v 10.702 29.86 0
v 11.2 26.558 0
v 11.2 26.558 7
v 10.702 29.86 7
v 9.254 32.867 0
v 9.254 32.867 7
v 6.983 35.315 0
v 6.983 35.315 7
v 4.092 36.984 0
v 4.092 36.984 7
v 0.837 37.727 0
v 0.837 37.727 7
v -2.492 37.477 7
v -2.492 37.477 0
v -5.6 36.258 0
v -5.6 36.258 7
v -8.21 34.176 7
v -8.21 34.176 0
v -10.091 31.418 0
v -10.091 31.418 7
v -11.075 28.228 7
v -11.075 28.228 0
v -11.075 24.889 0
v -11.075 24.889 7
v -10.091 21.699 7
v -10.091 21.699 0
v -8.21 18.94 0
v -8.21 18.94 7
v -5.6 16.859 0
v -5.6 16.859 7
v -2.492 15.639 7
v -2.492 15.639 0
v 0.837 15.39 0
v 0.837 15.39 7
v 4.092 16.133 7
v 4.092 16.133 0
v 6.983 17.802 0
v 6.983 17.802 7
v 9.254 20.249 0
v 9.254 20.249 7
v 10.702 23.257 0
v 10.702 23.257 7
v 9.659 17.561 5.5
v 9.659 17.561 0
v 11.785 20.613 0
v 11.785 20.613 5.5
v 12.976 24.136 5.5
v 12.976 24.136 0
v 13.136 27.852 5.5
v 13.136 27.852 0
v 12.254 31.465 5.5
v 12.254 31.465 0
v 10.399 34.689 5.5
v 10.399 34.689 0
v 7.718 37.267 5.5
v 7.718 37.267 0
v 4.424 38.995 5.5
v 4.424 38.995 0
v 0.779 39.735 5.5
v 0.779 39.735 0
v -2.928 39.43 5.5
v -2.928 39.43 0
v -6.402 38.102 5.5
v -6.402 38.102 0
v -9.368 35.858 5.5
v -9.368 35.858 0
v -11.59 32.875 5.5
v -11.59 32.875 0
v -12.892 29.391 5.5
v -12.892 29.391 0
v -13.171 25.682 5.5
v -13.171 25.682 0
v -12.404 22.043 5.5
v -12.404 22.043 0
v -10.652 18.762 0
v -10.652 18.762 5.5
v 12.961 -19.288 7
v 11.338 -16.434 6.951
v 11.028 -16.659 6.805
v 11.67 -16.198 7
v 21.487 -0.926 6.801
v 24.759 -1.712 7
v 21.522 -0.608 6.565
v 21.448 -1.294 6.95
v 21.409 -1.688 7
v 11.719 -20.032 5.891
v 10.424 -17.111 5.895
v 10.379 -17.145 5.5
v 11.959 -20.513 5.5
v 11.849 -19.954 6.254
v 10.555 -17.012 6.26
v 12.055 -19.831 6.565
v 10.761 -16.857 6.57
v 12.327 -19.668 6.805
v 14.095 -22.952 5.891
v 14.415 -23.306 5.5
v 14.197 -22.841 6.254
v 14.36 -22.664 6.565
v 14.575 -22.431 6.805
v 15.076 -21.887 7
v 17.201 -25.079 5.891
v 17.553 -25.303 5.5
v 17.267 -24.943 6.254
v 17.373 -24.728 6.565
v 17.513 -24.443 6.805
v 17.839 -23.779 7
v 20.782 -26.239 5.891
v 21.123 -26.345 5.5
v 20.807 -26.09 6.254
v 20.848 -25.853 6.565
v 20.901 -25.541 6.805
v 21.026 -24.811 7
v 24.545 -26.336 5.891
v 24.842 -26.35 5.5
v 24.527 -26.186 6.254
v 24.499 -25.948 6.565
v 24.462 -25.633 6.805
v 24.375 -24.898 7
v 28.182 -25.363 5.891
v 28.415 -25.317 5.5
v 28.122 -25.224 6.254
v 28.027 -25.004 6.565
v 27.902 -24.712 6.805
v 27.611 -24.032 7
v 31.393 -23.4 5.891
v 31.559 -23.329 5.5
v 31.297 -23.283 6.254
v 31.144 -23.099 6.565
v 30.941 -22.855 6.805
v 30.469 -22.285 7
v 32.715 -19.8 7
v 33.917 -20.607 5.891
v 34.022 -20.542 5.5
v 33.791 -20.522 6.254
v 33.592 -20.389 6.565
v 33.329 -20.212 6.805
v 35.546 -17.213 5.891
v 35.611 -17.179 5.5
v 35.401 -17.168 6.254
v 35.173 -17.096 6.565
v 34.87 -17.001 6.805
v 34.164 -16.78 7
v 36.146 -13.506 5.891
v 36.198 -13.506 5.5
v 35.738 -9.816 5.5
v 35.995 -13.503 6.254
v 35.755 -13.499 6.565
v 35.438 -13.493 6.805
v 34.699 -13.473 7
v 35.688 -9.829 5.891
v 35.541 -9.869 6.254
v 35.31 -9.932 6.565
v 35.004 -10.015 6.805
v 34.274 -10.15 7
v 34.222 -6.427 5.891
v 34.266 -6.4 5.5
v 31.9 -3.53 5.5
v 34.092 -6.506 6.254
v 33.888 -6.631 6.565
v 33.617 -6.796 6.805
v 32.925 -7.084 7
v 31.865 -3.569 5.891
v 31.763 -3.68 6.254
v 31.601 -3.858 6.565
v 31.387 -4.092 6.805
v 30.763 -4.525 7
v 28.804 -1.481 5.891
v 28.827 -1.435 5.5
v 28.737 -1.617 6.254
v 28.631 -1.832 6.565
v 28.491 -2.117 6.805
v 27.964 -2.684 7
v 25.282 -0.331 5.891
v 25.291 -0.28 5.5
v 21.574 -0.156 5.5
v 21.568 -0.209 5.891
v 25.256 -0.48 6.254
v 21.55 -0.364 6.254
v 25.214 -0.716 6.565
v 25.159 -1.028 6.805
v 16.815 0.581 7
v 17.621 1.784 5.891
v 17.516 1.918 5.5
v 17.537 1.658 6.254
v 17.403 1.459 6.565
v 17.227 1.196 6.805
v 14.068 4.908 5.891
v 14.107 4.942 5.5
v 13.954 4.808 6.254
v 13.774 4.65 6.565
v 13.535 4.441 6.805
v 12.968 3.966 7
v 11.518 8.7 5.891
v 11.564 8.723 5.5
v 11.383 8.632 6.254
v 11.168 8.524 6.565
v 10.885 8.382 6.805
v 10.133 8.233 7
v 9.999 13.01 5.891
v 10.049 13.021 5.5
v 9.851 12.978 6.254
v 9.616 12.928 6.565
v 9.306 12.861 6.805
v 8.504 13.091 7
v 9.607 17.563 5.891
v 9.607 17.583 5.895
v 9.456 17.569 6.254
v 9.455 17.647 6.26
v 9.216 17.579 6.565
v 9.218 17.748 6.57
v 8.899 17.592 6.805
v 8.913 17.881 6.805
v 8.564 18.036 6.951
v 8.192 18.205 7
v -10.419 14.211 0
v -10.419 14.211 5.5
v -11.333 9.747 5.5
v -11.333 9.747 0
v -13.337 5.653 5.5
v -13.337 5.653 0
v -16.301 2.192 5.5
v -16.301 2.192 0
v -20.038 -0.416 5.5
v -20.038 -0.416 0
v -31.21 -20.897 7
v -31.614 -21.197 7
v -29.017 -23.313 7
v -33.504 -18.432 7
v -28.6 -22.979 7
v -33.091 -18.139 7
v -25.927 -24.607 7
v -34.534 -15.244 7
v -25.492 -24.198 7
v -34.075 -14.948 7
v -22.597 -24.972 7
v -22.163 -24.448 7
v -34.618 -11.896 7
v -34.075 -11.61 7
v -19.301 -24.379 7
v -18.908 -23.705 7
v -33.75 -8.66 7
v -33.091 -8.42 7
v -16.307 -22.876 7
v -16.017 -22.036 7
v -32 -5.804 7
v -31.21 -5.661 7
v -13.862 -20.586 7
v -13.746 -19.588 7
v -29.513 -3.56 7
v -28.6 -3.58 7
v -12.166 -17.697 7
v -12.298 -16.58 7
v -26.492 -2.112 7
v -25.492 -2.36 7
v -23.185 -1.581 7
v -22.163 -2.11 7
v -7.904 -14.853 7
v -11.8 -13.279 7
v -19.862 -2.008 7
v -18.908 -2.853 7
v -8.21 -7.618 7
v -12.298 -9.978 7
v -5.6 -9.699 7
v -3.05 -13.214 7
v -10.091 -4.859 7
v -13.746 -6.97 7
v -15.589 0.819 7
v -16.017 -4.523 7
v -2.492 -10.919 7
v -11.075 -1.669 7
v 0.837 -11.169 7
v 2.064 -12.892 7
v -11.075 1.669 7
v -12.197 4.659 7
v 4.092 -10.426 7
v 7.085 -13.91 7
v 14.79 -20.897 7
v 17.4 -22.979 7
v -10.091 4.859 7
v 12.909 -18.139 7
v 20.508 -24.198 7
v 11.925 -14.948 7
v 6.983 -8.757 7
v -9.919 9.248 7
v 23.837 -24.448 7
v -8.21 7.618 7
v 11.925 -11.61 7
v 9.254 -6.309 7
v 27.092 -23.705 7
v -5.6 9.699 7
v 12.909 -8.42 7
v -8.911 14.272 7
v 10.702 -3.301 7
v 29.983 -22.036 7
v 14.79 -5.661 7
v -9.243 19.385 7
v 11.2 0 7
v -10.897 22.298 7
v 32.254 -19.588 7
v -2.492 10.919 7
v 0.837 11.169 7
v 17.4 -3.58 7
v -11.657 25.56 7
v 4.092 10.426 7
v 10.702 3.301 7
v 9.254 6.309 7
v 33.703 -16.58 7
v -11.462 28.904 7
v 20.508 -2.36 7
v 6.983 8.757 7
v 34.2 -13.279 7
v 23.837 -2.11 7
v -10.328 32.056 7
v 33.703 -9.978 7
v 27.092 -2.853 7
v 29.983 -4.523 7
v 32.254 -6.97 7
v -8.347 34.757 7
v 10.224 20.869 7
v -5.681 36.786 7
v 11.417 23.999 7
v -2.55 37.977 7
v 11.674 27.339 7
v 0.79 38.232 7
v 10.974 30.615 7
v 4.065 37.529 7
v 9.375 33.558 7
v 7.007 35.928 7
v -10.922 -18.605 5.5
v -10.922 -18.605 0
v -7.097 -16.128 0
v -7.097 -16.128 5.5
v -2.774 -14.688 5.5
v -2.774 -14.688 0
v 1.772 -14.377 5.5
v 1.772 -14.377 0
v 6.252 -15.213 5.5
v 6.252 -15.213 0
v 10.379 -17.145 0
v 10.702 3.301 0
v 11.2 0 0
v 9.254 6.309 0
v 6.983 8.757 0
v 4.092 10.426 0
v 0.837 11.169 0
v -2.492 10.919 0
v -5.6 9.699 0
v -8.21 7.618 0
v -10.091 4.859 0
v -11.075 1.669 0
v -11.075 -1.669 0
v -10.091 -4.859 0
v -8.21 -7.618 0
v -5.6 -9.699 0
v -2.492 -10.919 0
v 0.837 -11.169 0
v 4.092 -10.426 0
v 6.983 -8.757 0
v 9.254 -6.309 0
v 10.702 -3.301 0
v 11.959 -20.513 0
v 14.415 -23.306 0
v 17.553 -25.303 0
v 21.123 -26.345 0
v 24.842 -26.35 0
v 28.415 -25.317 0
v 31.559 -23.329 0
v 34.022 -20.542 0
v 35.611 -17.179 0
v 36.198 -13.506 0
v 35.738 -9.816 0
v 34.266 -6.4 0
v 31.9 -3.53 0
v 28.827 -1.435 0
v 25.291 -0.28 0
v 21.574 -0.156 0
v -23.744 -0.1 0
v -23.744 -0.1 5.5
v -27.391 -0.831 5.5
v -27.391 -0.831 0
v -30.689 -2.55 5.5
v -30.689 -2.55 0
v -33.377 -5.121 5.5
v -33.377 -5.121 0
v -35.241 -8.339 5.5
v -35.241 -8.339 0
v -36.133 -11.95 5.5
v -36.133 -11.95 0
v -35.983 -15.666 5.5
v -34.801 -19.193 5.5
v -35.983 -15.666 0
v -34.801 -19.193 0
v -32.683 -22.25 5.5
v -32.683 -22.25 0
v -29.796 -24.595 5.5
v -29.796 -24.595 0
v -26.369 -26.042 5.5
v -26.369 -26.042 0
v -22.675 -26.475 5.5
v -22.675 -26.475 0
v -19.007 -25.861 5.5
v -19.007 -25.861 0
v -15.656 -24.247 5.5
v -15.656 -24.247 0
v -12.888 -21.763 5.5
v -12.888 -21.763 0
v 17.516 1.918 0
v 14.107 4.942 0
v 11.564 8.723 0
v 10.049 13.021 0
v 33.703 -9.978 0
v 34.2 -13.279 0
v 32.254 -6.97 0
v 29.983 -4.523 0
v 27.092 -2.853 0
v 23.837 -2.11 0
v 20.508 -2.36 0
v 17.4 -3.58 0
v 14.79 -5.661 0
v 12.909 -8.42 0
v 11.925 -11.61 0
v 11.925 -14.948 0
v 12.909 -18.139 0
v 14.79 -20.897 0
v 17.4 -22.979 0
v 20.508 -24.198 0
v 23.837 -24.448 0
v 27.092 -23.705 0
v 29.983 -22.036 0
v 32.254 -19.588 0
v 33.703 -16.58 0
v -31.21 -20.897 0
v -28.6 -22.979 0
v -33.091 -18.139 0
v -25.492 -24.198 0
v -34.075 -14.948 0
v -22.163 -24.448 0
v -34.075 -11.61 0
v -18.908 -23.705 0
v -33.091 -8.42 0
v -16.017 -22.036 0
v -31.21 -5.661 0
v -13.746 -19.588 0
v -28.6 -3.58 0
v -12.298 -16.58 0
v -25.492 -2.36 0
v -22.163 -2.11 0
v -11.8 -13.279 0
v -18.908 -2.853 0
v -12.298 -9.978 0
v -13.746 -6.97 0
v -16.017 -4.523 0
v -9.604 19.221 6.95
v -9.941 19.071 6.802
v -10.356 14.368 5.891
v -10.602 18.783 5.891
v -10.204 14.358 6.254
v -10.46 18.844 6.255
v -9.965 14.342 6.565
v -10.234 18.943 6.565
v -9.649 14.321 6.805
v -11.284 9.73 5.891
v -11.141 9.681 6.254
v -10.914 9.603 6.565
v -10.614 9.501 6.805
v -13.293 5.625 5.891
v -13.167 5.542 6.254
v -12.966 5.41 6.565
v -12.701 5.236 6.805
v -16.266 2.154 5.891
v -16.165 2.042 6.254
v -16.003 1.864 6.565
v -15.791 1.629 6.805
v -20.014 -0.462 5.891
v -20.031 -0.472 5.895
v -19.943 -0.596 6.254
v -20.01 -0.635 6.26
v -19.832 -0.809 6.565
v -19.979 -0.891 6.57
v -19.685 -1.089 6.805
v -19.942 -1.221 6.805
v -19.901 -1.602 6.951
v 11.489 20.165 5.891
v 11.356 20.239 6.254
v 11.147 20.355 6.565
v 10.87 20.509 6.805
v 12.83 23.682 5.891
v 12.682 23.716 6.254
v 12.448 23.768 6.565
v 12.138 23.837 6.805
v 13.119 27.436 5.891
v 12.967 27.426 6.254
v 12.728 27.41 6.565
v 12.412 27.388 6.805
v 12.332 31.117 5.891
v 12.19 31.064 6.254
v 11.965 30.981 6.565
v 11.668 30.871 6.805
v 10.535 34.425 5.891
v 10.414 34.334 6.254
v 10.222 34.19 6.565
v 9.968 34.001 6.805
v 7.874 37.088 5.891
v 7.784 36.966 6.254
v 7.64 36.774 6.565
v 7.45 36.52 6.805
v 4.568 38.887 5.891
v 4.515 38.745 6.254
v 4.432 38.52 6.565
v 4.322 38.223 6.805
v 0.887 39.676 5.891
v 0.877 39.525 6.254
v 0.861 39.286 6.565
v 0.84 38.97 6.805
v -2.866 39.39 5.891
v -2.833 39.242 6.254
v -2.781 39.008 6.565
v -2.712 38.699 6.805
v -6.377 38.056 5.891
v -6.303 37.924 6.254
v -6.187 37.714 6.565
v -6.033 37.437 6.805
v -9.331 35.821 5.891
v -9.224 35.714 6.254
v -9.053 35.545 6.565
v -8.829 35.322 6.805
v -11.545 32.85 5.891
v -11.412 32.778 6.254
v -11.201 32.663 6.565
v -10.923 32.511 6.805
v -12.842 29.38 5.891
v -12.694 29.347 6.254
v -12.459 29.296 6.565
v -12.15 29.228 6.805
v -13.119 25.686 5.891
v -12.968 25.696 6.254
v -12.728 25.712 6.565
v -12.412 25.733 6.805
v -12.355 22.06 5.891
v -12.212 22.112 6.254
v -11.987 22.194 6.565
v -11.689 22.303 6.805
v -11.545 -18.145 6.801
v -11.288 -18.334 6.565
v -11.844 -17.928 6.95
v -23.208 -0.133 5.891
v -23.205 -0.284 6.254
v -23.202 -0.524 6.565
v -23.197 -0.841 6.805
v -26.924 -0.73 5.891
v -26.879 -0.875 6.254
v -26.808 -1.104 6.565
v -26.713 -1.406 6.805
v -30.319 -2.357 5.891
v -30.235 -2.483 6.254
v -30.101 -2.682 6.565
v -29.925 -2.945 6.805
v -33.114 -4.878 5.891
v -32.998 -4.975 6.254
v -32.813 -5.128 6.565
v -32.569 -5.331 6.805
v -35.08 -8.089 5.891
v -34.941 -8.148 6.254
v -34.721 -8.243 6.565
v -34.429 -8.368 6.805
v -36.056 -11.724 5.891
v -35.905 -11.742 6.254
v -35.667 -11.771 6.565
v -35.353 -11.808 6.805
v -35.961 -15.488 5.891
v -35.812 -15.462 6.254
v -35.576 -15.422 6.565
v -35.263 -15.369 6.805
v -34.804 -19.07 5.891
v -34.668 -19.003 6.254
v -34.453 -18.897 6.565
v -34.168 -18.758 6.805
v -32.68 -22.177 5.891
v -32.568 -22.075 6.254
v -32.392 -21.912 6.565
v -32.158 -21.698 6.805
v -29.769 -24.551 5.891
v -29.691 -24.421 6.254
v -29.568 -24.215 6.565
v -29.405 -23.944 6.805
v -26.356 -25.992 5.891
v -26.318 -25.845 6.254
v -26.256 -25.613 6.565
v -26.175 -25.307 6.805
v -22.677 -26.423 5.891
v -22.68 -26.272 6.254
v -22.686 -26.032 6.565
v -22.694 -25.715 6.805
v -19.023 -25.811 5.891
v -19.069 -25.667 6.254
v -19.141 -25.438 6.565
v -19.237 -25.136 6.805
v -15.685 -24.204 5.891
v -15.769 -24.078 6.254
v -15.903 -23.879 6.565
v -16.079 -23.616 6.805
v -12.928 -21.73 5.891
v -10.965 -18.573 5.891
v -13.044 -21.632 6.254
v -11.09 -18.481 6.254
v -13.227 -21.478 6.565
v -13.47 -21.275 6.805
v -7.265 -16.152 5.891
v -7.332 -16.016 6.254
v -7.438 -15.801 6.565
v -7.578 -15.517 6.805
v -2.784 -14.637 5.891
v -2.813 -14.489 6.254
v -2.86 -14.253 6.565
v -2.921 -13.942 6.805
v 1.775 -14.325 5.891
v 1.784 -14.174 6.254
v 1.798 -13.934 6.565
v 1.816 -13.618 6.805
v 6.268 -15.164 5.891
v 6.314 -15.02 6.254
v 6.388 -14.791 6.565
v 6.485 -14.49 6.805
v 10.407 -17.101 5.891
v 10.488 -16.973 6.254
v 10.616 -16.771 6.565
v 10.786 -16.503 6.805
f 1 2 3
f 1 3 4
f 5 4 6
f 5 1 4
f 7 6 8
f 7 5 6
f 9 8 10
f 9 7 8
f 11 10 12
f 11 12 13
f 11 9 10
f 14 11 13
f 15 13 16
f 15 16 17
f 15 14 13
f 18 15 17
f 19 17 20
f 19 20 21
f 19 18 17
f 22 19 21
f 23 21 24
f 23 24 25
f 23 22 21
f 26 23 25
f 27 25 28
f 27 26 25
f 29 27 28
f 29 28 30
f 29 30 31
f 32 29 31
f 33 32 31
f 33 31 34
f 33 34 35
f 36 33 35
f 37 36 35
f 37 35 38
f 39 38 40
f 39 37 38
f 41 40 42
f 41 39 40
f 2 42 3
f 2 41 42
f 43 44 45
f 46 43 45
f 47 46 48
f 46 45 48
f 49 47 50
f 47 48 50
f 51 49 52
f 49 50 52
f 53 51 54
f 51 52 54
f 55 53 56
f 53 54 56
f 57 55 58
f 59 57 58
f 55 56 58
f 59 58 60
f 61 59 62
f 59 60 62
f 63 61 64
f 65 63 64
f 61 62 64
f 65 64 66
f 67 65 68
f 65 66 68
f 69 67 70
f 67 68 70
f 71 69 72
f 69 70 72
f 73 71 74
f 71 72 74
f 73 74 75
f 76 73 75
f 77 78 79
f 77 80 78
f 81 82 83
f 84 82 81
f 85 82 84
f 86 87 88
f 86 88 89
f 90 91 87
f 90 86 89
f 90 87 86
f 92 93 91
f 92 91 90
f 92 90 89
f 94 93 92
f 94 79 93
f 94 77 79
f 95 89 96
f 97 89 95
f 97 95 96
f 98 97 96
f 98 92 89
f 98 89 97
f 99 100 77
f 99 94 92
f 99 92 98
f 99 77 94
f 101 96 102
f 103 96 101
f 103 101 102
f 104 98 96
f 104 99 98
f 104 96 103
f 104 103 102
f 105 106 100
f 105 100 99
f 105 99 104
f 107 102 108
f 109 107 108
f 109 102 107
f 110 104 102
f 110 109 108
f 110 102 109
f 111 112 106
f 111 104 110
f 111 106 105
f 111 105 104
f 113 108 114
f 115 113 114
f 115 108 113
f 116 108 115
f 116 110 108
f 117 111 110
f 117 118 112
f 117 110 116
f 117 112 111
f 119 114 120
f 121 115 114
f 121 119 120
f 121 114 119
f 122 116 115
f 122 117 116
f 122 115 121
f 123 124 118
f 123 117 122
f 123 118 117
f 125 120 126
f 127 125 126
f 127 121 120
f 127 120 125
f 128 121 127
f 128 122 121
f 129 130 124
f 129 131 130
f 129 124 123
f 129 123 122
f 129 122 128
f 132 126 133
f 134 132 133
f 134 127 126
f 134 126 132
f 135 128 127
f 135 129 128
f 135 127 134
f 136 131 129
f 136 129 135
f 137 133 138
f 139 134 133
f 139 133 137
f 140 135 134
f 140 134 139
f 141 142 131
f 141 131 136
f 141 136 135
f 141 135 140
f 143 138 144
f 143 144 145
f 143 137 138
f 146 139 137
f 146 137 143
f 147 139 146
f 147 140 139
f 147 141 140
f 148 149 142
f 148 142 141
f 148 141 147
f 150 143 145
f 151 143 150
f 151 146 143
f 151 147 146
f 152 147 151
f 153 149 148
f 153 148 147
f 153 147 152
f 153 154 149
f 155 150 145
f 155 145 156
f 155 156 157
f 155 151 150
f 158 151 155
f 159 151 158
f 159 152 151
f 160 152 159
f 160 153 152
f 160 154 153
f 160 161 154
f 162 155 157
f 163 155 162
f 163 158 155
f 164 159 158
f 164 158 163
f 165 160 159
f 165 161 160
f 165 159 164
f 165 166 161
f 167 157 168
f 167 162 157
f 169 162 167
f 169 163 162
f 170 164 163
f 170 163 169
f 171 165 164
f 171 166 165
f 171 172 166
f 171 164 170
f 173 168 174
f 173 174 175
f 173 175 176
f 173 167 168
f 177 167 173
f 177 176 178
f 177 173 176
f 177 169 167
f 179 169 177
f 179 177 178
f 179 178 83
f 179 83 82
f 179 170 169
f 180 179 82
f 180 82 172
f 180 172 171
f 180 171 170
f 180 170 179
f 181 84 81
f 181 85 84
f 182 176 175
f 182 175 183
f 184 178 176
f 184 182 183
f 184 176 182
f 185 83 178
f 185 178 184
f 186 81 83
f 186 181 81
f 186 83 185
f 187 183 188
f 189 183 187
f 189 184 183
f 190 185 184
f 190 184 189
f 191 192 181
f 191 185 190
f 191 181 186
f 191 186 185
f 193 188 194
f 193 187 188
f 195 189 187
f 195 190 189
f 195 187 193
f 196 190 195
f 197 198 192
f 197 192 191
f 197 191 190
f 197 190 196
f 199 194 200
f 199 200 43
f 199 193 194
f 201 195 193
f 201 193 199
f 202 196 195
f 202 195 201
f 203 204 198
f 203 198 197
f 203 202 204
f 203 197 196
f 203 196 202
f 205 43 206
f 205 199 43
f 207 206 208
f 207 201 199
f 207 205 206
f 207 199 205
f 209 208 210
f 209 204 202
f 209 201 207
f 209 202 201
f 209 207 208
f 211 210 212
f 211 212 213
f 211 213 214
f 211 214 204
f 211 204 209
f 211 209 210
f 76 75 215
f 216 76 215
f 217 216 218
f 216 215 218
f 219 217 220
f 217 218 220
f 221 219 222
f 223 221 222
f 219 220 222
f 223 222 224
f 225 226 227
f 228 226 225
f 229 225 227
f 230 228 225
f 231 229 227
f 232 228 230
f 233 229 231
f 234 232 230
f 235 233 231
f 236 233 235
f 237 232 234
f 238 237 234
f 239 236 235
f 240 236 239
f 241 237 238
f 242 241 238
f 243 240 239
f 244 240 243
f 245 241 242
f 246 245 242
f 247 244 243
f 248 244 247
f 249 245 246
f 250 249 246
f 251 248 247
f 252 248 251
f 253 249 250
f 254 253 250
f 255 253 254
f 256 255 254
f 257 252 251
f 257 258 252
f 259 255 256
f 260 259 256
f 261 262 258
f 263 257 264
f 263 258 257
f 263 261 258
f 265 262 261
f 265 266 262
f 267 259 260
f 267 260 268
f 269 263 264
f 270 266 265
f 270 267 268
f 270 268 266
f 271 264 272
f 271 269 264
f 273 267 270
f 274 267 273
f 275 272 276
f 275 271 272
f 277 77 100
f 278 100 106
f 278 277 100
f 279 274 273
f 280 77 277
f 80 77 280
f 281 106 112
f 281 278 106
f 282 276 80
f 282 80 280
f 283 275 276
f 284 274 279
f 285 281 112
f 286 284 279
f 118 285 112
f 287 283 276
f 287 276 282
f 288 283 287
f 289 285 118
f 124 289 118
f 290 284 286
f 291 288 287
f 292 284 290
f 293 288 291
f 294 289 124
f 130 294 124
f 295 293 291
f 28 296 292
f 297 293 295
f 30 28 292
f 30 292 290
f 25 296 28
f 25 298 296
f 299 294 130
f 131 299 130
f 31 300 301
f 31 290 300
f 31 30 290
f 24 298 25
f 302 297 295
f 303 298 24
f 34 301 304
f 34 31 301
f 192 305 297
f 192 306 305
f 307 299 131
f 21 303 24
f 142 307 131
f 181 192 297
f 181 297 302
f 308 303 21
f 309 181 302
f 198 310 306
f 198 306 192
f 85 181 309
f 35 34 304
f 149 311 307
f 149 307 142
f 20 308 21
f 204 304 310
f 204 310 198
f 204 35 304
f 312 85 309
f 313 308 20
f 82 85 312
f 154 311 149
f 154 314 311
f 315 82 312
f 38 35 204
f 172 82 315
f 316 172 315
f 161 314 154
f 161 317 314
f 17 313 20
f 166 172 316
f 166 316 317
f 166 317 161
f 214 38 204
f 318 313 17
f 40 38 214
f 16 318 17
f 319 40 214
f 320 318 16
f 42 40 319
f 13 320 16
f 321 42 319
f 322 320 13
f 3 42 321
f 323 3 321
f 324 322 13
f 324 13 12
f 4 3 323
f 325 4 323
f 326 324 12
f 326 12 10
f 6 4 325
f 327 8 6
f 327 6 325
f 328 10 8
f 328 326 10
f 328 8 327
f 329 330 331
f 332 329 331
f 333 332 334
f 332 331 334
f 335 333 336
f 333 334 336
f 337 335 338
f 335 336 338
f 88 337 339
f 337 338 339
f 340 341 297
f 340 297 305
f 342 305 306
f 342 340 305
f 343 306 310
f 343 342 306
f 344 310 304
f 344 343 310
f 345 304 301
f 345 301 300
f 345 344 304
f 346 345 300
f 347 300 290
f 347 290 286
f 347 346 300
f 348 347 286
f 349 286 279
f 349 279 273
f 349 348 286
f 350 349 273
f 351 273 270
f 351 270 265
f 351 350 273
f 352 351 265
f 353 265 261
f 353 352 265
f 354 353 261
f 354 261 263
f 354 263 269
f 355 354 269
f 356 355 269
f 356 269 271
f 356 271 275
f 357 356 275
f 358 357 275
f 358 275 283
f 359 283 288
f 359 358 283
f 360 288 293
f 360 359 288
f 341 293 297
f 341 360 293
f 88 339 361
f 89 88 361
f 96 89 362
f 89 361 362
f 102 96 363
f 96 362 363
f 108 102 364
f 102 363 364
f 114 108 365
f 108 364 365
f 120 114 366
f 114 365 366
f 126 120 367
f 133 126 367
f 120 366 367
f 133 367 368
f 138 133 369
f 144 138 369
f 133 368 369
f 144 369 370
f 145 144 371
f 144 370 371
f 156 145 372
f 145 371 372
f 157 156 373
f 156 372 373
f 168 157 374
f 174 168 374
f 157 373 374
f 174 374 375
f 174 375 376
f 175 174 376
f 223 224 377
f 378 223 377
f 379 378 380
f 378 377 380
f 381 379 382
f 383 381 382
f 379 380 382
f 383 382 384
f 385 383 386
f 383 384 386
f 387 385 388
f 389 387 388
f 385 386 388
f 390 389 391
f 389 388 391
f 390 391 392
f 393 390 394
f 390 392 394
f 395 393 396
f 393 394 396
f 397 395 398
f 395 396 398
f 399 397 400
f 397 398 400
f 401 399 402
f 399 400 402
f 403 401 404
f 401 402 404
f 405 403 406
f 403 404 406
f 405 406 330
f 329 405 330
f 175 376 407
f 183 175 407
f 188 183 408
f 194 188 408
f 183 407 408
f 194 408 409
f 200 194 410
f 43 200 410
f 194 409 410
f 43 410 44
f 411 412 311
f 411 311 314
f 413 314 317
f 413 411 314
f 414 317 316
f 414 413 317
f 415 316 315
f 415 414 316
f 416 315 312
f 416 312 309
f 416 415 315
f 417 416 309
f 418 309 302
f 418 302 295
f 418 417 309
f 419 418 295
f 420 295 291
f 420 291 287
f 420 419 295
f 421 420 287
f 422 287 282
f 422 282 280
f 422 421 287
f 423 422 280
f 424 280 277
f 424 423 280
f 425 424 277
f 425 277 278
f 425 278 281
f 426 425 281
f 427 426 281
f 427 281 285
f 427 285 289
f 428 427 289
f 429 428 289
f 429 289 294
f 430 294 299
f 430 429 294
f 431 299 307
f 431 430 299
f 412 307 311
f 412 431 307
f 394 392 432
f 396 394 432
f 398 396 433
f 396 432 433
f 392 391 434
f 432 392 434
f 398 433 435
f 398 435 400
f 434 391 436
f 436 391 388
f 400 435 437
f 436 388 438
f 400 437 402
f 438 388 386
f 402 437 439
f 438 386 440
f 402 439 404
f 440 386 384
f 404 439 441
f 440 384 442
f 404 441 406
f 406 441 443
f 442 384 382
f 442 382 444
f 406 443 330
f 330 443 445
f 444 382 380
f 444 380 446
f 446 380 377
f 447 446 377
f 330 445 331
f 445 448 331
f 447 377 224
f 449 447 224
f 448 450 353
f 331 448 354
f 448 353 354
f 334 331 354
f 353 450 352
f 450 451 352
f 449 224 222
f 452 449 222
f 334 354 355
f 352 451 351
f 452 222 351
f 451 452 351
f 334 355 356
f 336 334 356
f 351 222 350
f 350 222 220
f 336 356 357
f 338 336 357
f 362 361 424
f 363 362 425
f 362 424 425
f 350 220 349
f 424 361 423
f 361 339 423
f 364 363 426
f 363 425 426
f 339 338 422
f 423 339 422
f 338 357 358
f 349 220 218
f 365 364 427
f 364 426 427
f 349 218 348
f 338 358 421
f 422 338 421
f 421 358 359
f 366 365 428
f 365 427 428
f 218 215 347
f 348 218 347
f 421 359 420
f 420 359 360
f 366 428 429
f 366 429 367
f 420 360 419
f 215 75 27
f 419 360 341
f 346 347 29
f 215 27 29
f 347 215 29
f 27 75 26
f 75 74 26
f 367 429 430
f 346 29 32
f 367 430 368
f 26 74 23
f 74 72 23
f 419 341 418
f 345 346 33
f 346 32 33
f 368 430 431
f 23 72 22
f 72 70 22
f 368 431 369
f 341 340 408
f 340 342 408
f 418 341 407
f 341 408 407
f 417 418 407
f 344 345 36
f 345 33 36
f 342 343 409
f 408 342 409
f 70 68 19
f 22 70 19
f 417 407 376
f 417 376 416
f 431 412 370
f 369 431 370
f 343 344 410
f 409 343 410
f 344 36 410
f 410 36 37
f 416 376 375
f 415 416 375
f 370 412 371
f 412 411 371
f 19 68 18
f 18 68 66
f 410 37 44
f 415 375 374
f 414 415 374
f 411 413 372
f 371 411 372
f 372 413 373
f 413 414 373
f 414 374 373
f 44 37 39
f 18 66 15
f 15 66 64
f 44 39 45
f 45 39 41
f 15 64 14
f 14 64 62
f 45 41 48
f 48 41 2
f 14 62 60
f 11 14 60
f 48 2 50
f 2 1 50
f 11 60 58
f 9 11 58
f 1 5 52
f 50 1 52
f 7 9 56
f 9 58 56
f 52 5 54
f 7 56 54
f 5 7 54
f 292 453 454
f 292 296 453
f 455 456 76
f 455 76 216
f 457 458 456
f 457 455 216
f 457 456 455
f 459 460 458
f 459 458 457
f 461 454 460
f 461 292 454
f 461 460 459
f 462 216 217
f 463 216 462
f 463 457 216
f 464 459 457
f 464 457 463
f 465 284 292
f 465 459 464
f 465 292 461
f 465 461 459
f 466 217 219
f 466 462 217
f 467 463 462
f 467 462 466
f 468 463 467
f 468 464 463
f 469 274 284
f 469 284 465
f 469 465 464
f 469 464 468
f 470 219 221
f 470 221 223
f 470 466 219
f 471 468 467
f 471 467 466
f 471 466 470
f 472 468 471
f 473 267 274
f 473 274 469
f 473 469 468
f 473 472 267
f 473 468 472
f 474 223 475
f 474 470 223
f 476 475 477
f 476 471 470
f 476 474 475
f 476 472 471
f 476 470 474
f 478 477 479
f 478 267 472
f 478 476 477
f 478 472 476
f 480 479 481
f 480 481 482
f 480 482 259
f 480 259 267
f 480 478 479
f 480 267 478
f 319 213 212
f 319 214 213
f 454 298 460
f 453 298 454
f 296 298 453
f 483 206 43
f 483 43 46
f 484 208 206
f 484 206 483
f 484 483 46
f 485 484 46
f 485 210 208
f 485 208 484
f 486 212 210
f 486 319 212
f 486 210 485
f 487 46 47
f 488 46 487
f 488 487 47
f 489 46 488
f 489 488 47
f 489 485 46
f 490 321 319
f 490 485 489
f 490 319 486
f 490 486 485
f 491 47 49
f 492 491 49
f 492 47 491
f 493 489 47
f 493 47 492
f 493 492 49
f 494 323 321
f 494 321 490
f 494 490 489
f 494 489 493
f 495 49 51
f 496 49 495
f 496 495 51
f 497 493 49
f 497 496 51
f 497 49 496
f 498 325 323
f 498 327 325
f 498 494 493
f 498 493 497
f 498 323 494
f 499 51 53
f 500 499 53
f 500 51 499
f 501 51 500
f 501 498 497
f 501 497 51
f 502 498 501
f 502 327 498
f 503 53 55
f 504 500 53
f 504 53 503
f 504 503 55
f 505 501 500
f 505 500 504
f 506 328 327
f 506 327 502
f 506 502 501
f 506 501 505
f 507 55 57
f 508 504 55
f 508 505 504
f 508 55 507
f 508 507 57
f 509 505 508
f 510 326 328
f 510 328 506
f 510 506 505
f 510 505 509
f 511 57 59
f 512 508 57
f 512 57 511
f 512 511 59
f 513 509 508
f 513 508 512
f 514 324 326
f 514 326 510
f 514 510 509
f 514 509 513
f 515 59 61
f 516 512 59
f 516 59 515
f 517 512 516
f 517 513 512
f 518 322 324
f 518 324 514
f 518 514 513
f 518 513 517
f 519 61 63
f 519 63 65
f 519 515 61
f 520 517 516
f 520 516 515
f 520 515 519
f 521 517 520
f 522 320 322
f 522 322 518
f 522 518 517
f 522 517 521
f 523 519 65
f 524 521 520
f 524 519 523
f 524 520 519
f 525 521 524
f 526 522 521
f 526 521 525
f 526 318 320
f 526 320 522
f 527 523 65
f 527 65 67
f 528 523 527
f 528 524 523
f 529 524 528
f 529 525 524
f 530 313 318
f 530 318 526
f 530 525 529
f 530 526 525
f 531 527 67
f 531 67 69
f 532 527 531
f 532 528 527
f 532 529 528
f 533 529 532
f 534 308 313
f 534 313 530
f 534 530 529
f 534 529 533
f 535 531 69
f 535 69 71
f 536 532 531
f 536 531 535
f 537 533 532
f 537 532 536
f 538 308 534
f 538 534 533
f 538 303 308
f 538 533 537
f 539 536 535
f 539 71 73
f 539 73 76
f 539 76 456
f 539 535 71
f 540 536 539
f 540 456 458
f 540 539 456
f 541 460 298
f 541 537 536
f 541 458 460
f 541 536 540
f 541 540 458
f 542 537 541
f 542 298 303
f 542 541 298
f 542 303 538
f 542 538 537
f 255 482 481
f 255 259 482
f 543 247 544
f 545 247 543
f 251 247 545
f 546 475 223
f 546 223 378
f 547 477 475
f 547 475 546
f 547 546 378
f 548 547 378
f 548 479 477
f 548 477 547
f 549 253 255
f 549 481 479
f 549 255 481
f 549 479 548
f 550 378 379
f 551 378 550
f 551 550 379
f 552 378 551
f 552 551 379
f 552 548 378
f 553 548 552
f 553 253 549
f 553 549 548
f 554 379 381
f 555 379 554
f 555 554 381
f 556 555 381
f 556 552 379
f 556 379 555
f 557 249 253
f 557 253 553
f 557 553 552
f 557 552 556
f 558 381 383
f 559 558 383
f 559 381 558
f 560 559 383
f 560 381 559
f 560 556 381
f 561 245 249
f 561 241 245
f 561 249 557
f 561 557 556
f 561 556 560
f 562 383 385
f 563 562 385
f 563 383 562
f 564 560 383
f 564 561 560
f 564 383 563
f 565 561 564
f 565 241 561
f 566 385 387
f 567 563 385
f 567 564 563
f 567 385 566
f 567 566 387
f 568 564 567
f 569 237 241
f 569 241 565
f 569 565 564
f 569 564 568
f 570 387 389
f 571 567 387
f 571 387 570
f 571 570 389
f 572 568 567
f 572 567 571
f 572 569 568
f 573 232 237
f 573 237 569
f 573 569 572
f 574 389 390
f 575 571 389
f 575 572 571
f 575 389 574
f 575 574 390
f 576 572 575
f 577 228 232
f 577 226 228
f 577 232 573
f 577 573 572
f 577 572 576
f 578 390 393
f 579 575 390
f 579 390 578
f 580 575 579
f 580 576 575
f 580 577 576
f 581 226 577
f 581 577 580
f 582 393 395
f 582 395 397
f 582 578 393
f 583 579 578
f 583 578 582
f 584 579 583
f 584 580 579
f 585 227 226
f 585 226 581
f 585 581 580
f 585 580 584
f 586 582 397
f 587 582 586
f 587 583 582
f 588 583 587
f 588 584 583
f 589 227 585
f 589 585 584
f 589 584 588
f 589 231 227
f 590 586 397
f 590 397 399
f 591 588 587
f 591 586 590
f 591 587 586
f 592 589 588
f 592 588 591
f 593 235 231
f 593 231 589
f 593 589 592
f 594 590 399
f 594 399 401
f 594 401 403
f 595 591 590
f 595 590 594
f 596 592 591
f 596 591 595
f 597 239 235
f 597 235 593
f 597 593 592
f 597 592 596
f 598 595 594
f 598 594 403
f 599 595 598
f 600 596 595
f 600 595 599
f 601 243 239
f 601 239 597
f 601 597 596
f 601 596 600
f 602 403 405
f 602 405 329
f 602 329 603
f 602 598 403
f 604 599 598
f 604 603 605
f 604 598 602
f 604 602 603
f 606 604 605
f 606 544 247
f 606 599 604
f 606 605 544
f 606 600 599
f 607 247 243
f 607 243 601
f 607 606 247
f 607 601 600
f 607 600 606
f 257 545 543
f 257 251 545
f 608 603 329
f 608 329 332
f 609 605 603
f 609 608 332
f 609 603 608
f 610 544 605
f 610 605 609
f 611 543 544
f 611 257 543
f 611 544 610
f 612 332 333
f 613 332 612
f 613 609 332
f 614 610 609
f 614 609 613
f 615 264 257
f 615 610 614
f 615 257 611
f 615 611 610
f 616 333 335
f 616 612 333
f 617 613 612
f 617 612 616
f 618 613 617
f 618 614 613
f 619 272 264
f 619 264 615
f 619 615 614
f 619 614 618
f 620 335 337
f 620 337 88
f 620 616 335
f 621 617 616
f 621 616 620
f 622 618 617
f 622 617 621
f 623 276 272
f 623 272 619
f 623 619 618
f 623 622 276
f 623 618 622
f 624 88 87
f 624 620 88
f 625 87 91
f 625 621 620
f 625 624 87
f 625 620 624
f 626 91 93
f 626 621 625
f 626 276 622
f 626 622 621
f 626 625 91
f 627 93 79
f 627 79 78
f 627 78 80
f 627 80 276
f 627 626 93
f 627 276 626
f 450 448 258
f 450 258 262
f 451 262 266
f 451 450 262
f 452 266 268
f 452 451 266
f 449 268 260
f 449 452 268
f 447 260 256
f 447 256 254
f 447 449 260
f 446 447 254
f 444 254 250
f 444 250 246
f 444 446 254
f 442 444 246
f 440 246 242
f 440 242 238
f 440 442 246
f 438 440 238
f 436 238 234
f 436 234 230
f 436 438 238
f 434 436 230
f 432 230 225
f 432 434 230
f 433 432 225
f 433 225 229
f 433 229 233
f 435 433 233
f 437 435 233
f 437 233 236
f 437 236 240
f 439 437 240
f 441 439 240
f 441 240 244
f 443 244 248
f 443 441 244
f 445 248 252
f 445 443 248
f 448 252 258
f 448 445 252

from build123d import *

# Parameters (mm, degrees)
F0_R     = 11.2
F1_DEPTH = 7
F2_R     = 1.5


with BuildPart() as f1:
    # F0 (on Top) → F1 (new body)
    with BuildSketch(Plane.XY):
        with BuildLine():
            ThreePointArc((21.573992, -0.156424), (12.716124, 6.751931), (9.658758, 17.561174))
            ThreePointArc((9.658758, 17.561174), (0.778972, 39.735301), (-10.651529, 18.761837))
            ThreePointArc((-10.651529, 18.761837), (-12.205406, 7.636521), (-20.037801, -0.415857))
            ThreePointArc((-20.037801, -0.415857), (-34.801266, -19.193041), (-10.922463, -18.605414))
            ThreePointArc((-10.922463, -18.605414), (-0.510718, -14.388452), (10.379043, -17.145317))
            ThreePointArc((10.379043, -17.145317), (34.022294, -20.54226), (21.573992, -0.156424))
        make_face()
        with Locations((-23.000168, -13.279153)):
            Circle(F0_R, mode=Mode.SUBTRACT)
        with Locations((23.000168, -13.279153)):
            Circle(F0_R, mode=Mode.SUBTRACT)
        Circle(F0_R, mode=Mode.SUBTRACT)
        with Locations((0, 26.558306)):
            Circle(F0_R, mode=Mode.SUBTRACT)
    extrude(amount=F1_DEPTH)

    # F2
    f2_edges = [f1.edges().sort_by_distance(p)[0] for p in [
        (-0.510718, -14.388452, 7),
        (-34.801266, -19.193041, 7),
        (-12.205406, 7.636521, 7),
        (0.778972, 39.735301, 7),
        (12.716124, 6.751931, 7),
        (34.022294, -20.54226, 7),
    ]]
    fillet(f2_edges, radius=F2_R)


solid = f1.part
